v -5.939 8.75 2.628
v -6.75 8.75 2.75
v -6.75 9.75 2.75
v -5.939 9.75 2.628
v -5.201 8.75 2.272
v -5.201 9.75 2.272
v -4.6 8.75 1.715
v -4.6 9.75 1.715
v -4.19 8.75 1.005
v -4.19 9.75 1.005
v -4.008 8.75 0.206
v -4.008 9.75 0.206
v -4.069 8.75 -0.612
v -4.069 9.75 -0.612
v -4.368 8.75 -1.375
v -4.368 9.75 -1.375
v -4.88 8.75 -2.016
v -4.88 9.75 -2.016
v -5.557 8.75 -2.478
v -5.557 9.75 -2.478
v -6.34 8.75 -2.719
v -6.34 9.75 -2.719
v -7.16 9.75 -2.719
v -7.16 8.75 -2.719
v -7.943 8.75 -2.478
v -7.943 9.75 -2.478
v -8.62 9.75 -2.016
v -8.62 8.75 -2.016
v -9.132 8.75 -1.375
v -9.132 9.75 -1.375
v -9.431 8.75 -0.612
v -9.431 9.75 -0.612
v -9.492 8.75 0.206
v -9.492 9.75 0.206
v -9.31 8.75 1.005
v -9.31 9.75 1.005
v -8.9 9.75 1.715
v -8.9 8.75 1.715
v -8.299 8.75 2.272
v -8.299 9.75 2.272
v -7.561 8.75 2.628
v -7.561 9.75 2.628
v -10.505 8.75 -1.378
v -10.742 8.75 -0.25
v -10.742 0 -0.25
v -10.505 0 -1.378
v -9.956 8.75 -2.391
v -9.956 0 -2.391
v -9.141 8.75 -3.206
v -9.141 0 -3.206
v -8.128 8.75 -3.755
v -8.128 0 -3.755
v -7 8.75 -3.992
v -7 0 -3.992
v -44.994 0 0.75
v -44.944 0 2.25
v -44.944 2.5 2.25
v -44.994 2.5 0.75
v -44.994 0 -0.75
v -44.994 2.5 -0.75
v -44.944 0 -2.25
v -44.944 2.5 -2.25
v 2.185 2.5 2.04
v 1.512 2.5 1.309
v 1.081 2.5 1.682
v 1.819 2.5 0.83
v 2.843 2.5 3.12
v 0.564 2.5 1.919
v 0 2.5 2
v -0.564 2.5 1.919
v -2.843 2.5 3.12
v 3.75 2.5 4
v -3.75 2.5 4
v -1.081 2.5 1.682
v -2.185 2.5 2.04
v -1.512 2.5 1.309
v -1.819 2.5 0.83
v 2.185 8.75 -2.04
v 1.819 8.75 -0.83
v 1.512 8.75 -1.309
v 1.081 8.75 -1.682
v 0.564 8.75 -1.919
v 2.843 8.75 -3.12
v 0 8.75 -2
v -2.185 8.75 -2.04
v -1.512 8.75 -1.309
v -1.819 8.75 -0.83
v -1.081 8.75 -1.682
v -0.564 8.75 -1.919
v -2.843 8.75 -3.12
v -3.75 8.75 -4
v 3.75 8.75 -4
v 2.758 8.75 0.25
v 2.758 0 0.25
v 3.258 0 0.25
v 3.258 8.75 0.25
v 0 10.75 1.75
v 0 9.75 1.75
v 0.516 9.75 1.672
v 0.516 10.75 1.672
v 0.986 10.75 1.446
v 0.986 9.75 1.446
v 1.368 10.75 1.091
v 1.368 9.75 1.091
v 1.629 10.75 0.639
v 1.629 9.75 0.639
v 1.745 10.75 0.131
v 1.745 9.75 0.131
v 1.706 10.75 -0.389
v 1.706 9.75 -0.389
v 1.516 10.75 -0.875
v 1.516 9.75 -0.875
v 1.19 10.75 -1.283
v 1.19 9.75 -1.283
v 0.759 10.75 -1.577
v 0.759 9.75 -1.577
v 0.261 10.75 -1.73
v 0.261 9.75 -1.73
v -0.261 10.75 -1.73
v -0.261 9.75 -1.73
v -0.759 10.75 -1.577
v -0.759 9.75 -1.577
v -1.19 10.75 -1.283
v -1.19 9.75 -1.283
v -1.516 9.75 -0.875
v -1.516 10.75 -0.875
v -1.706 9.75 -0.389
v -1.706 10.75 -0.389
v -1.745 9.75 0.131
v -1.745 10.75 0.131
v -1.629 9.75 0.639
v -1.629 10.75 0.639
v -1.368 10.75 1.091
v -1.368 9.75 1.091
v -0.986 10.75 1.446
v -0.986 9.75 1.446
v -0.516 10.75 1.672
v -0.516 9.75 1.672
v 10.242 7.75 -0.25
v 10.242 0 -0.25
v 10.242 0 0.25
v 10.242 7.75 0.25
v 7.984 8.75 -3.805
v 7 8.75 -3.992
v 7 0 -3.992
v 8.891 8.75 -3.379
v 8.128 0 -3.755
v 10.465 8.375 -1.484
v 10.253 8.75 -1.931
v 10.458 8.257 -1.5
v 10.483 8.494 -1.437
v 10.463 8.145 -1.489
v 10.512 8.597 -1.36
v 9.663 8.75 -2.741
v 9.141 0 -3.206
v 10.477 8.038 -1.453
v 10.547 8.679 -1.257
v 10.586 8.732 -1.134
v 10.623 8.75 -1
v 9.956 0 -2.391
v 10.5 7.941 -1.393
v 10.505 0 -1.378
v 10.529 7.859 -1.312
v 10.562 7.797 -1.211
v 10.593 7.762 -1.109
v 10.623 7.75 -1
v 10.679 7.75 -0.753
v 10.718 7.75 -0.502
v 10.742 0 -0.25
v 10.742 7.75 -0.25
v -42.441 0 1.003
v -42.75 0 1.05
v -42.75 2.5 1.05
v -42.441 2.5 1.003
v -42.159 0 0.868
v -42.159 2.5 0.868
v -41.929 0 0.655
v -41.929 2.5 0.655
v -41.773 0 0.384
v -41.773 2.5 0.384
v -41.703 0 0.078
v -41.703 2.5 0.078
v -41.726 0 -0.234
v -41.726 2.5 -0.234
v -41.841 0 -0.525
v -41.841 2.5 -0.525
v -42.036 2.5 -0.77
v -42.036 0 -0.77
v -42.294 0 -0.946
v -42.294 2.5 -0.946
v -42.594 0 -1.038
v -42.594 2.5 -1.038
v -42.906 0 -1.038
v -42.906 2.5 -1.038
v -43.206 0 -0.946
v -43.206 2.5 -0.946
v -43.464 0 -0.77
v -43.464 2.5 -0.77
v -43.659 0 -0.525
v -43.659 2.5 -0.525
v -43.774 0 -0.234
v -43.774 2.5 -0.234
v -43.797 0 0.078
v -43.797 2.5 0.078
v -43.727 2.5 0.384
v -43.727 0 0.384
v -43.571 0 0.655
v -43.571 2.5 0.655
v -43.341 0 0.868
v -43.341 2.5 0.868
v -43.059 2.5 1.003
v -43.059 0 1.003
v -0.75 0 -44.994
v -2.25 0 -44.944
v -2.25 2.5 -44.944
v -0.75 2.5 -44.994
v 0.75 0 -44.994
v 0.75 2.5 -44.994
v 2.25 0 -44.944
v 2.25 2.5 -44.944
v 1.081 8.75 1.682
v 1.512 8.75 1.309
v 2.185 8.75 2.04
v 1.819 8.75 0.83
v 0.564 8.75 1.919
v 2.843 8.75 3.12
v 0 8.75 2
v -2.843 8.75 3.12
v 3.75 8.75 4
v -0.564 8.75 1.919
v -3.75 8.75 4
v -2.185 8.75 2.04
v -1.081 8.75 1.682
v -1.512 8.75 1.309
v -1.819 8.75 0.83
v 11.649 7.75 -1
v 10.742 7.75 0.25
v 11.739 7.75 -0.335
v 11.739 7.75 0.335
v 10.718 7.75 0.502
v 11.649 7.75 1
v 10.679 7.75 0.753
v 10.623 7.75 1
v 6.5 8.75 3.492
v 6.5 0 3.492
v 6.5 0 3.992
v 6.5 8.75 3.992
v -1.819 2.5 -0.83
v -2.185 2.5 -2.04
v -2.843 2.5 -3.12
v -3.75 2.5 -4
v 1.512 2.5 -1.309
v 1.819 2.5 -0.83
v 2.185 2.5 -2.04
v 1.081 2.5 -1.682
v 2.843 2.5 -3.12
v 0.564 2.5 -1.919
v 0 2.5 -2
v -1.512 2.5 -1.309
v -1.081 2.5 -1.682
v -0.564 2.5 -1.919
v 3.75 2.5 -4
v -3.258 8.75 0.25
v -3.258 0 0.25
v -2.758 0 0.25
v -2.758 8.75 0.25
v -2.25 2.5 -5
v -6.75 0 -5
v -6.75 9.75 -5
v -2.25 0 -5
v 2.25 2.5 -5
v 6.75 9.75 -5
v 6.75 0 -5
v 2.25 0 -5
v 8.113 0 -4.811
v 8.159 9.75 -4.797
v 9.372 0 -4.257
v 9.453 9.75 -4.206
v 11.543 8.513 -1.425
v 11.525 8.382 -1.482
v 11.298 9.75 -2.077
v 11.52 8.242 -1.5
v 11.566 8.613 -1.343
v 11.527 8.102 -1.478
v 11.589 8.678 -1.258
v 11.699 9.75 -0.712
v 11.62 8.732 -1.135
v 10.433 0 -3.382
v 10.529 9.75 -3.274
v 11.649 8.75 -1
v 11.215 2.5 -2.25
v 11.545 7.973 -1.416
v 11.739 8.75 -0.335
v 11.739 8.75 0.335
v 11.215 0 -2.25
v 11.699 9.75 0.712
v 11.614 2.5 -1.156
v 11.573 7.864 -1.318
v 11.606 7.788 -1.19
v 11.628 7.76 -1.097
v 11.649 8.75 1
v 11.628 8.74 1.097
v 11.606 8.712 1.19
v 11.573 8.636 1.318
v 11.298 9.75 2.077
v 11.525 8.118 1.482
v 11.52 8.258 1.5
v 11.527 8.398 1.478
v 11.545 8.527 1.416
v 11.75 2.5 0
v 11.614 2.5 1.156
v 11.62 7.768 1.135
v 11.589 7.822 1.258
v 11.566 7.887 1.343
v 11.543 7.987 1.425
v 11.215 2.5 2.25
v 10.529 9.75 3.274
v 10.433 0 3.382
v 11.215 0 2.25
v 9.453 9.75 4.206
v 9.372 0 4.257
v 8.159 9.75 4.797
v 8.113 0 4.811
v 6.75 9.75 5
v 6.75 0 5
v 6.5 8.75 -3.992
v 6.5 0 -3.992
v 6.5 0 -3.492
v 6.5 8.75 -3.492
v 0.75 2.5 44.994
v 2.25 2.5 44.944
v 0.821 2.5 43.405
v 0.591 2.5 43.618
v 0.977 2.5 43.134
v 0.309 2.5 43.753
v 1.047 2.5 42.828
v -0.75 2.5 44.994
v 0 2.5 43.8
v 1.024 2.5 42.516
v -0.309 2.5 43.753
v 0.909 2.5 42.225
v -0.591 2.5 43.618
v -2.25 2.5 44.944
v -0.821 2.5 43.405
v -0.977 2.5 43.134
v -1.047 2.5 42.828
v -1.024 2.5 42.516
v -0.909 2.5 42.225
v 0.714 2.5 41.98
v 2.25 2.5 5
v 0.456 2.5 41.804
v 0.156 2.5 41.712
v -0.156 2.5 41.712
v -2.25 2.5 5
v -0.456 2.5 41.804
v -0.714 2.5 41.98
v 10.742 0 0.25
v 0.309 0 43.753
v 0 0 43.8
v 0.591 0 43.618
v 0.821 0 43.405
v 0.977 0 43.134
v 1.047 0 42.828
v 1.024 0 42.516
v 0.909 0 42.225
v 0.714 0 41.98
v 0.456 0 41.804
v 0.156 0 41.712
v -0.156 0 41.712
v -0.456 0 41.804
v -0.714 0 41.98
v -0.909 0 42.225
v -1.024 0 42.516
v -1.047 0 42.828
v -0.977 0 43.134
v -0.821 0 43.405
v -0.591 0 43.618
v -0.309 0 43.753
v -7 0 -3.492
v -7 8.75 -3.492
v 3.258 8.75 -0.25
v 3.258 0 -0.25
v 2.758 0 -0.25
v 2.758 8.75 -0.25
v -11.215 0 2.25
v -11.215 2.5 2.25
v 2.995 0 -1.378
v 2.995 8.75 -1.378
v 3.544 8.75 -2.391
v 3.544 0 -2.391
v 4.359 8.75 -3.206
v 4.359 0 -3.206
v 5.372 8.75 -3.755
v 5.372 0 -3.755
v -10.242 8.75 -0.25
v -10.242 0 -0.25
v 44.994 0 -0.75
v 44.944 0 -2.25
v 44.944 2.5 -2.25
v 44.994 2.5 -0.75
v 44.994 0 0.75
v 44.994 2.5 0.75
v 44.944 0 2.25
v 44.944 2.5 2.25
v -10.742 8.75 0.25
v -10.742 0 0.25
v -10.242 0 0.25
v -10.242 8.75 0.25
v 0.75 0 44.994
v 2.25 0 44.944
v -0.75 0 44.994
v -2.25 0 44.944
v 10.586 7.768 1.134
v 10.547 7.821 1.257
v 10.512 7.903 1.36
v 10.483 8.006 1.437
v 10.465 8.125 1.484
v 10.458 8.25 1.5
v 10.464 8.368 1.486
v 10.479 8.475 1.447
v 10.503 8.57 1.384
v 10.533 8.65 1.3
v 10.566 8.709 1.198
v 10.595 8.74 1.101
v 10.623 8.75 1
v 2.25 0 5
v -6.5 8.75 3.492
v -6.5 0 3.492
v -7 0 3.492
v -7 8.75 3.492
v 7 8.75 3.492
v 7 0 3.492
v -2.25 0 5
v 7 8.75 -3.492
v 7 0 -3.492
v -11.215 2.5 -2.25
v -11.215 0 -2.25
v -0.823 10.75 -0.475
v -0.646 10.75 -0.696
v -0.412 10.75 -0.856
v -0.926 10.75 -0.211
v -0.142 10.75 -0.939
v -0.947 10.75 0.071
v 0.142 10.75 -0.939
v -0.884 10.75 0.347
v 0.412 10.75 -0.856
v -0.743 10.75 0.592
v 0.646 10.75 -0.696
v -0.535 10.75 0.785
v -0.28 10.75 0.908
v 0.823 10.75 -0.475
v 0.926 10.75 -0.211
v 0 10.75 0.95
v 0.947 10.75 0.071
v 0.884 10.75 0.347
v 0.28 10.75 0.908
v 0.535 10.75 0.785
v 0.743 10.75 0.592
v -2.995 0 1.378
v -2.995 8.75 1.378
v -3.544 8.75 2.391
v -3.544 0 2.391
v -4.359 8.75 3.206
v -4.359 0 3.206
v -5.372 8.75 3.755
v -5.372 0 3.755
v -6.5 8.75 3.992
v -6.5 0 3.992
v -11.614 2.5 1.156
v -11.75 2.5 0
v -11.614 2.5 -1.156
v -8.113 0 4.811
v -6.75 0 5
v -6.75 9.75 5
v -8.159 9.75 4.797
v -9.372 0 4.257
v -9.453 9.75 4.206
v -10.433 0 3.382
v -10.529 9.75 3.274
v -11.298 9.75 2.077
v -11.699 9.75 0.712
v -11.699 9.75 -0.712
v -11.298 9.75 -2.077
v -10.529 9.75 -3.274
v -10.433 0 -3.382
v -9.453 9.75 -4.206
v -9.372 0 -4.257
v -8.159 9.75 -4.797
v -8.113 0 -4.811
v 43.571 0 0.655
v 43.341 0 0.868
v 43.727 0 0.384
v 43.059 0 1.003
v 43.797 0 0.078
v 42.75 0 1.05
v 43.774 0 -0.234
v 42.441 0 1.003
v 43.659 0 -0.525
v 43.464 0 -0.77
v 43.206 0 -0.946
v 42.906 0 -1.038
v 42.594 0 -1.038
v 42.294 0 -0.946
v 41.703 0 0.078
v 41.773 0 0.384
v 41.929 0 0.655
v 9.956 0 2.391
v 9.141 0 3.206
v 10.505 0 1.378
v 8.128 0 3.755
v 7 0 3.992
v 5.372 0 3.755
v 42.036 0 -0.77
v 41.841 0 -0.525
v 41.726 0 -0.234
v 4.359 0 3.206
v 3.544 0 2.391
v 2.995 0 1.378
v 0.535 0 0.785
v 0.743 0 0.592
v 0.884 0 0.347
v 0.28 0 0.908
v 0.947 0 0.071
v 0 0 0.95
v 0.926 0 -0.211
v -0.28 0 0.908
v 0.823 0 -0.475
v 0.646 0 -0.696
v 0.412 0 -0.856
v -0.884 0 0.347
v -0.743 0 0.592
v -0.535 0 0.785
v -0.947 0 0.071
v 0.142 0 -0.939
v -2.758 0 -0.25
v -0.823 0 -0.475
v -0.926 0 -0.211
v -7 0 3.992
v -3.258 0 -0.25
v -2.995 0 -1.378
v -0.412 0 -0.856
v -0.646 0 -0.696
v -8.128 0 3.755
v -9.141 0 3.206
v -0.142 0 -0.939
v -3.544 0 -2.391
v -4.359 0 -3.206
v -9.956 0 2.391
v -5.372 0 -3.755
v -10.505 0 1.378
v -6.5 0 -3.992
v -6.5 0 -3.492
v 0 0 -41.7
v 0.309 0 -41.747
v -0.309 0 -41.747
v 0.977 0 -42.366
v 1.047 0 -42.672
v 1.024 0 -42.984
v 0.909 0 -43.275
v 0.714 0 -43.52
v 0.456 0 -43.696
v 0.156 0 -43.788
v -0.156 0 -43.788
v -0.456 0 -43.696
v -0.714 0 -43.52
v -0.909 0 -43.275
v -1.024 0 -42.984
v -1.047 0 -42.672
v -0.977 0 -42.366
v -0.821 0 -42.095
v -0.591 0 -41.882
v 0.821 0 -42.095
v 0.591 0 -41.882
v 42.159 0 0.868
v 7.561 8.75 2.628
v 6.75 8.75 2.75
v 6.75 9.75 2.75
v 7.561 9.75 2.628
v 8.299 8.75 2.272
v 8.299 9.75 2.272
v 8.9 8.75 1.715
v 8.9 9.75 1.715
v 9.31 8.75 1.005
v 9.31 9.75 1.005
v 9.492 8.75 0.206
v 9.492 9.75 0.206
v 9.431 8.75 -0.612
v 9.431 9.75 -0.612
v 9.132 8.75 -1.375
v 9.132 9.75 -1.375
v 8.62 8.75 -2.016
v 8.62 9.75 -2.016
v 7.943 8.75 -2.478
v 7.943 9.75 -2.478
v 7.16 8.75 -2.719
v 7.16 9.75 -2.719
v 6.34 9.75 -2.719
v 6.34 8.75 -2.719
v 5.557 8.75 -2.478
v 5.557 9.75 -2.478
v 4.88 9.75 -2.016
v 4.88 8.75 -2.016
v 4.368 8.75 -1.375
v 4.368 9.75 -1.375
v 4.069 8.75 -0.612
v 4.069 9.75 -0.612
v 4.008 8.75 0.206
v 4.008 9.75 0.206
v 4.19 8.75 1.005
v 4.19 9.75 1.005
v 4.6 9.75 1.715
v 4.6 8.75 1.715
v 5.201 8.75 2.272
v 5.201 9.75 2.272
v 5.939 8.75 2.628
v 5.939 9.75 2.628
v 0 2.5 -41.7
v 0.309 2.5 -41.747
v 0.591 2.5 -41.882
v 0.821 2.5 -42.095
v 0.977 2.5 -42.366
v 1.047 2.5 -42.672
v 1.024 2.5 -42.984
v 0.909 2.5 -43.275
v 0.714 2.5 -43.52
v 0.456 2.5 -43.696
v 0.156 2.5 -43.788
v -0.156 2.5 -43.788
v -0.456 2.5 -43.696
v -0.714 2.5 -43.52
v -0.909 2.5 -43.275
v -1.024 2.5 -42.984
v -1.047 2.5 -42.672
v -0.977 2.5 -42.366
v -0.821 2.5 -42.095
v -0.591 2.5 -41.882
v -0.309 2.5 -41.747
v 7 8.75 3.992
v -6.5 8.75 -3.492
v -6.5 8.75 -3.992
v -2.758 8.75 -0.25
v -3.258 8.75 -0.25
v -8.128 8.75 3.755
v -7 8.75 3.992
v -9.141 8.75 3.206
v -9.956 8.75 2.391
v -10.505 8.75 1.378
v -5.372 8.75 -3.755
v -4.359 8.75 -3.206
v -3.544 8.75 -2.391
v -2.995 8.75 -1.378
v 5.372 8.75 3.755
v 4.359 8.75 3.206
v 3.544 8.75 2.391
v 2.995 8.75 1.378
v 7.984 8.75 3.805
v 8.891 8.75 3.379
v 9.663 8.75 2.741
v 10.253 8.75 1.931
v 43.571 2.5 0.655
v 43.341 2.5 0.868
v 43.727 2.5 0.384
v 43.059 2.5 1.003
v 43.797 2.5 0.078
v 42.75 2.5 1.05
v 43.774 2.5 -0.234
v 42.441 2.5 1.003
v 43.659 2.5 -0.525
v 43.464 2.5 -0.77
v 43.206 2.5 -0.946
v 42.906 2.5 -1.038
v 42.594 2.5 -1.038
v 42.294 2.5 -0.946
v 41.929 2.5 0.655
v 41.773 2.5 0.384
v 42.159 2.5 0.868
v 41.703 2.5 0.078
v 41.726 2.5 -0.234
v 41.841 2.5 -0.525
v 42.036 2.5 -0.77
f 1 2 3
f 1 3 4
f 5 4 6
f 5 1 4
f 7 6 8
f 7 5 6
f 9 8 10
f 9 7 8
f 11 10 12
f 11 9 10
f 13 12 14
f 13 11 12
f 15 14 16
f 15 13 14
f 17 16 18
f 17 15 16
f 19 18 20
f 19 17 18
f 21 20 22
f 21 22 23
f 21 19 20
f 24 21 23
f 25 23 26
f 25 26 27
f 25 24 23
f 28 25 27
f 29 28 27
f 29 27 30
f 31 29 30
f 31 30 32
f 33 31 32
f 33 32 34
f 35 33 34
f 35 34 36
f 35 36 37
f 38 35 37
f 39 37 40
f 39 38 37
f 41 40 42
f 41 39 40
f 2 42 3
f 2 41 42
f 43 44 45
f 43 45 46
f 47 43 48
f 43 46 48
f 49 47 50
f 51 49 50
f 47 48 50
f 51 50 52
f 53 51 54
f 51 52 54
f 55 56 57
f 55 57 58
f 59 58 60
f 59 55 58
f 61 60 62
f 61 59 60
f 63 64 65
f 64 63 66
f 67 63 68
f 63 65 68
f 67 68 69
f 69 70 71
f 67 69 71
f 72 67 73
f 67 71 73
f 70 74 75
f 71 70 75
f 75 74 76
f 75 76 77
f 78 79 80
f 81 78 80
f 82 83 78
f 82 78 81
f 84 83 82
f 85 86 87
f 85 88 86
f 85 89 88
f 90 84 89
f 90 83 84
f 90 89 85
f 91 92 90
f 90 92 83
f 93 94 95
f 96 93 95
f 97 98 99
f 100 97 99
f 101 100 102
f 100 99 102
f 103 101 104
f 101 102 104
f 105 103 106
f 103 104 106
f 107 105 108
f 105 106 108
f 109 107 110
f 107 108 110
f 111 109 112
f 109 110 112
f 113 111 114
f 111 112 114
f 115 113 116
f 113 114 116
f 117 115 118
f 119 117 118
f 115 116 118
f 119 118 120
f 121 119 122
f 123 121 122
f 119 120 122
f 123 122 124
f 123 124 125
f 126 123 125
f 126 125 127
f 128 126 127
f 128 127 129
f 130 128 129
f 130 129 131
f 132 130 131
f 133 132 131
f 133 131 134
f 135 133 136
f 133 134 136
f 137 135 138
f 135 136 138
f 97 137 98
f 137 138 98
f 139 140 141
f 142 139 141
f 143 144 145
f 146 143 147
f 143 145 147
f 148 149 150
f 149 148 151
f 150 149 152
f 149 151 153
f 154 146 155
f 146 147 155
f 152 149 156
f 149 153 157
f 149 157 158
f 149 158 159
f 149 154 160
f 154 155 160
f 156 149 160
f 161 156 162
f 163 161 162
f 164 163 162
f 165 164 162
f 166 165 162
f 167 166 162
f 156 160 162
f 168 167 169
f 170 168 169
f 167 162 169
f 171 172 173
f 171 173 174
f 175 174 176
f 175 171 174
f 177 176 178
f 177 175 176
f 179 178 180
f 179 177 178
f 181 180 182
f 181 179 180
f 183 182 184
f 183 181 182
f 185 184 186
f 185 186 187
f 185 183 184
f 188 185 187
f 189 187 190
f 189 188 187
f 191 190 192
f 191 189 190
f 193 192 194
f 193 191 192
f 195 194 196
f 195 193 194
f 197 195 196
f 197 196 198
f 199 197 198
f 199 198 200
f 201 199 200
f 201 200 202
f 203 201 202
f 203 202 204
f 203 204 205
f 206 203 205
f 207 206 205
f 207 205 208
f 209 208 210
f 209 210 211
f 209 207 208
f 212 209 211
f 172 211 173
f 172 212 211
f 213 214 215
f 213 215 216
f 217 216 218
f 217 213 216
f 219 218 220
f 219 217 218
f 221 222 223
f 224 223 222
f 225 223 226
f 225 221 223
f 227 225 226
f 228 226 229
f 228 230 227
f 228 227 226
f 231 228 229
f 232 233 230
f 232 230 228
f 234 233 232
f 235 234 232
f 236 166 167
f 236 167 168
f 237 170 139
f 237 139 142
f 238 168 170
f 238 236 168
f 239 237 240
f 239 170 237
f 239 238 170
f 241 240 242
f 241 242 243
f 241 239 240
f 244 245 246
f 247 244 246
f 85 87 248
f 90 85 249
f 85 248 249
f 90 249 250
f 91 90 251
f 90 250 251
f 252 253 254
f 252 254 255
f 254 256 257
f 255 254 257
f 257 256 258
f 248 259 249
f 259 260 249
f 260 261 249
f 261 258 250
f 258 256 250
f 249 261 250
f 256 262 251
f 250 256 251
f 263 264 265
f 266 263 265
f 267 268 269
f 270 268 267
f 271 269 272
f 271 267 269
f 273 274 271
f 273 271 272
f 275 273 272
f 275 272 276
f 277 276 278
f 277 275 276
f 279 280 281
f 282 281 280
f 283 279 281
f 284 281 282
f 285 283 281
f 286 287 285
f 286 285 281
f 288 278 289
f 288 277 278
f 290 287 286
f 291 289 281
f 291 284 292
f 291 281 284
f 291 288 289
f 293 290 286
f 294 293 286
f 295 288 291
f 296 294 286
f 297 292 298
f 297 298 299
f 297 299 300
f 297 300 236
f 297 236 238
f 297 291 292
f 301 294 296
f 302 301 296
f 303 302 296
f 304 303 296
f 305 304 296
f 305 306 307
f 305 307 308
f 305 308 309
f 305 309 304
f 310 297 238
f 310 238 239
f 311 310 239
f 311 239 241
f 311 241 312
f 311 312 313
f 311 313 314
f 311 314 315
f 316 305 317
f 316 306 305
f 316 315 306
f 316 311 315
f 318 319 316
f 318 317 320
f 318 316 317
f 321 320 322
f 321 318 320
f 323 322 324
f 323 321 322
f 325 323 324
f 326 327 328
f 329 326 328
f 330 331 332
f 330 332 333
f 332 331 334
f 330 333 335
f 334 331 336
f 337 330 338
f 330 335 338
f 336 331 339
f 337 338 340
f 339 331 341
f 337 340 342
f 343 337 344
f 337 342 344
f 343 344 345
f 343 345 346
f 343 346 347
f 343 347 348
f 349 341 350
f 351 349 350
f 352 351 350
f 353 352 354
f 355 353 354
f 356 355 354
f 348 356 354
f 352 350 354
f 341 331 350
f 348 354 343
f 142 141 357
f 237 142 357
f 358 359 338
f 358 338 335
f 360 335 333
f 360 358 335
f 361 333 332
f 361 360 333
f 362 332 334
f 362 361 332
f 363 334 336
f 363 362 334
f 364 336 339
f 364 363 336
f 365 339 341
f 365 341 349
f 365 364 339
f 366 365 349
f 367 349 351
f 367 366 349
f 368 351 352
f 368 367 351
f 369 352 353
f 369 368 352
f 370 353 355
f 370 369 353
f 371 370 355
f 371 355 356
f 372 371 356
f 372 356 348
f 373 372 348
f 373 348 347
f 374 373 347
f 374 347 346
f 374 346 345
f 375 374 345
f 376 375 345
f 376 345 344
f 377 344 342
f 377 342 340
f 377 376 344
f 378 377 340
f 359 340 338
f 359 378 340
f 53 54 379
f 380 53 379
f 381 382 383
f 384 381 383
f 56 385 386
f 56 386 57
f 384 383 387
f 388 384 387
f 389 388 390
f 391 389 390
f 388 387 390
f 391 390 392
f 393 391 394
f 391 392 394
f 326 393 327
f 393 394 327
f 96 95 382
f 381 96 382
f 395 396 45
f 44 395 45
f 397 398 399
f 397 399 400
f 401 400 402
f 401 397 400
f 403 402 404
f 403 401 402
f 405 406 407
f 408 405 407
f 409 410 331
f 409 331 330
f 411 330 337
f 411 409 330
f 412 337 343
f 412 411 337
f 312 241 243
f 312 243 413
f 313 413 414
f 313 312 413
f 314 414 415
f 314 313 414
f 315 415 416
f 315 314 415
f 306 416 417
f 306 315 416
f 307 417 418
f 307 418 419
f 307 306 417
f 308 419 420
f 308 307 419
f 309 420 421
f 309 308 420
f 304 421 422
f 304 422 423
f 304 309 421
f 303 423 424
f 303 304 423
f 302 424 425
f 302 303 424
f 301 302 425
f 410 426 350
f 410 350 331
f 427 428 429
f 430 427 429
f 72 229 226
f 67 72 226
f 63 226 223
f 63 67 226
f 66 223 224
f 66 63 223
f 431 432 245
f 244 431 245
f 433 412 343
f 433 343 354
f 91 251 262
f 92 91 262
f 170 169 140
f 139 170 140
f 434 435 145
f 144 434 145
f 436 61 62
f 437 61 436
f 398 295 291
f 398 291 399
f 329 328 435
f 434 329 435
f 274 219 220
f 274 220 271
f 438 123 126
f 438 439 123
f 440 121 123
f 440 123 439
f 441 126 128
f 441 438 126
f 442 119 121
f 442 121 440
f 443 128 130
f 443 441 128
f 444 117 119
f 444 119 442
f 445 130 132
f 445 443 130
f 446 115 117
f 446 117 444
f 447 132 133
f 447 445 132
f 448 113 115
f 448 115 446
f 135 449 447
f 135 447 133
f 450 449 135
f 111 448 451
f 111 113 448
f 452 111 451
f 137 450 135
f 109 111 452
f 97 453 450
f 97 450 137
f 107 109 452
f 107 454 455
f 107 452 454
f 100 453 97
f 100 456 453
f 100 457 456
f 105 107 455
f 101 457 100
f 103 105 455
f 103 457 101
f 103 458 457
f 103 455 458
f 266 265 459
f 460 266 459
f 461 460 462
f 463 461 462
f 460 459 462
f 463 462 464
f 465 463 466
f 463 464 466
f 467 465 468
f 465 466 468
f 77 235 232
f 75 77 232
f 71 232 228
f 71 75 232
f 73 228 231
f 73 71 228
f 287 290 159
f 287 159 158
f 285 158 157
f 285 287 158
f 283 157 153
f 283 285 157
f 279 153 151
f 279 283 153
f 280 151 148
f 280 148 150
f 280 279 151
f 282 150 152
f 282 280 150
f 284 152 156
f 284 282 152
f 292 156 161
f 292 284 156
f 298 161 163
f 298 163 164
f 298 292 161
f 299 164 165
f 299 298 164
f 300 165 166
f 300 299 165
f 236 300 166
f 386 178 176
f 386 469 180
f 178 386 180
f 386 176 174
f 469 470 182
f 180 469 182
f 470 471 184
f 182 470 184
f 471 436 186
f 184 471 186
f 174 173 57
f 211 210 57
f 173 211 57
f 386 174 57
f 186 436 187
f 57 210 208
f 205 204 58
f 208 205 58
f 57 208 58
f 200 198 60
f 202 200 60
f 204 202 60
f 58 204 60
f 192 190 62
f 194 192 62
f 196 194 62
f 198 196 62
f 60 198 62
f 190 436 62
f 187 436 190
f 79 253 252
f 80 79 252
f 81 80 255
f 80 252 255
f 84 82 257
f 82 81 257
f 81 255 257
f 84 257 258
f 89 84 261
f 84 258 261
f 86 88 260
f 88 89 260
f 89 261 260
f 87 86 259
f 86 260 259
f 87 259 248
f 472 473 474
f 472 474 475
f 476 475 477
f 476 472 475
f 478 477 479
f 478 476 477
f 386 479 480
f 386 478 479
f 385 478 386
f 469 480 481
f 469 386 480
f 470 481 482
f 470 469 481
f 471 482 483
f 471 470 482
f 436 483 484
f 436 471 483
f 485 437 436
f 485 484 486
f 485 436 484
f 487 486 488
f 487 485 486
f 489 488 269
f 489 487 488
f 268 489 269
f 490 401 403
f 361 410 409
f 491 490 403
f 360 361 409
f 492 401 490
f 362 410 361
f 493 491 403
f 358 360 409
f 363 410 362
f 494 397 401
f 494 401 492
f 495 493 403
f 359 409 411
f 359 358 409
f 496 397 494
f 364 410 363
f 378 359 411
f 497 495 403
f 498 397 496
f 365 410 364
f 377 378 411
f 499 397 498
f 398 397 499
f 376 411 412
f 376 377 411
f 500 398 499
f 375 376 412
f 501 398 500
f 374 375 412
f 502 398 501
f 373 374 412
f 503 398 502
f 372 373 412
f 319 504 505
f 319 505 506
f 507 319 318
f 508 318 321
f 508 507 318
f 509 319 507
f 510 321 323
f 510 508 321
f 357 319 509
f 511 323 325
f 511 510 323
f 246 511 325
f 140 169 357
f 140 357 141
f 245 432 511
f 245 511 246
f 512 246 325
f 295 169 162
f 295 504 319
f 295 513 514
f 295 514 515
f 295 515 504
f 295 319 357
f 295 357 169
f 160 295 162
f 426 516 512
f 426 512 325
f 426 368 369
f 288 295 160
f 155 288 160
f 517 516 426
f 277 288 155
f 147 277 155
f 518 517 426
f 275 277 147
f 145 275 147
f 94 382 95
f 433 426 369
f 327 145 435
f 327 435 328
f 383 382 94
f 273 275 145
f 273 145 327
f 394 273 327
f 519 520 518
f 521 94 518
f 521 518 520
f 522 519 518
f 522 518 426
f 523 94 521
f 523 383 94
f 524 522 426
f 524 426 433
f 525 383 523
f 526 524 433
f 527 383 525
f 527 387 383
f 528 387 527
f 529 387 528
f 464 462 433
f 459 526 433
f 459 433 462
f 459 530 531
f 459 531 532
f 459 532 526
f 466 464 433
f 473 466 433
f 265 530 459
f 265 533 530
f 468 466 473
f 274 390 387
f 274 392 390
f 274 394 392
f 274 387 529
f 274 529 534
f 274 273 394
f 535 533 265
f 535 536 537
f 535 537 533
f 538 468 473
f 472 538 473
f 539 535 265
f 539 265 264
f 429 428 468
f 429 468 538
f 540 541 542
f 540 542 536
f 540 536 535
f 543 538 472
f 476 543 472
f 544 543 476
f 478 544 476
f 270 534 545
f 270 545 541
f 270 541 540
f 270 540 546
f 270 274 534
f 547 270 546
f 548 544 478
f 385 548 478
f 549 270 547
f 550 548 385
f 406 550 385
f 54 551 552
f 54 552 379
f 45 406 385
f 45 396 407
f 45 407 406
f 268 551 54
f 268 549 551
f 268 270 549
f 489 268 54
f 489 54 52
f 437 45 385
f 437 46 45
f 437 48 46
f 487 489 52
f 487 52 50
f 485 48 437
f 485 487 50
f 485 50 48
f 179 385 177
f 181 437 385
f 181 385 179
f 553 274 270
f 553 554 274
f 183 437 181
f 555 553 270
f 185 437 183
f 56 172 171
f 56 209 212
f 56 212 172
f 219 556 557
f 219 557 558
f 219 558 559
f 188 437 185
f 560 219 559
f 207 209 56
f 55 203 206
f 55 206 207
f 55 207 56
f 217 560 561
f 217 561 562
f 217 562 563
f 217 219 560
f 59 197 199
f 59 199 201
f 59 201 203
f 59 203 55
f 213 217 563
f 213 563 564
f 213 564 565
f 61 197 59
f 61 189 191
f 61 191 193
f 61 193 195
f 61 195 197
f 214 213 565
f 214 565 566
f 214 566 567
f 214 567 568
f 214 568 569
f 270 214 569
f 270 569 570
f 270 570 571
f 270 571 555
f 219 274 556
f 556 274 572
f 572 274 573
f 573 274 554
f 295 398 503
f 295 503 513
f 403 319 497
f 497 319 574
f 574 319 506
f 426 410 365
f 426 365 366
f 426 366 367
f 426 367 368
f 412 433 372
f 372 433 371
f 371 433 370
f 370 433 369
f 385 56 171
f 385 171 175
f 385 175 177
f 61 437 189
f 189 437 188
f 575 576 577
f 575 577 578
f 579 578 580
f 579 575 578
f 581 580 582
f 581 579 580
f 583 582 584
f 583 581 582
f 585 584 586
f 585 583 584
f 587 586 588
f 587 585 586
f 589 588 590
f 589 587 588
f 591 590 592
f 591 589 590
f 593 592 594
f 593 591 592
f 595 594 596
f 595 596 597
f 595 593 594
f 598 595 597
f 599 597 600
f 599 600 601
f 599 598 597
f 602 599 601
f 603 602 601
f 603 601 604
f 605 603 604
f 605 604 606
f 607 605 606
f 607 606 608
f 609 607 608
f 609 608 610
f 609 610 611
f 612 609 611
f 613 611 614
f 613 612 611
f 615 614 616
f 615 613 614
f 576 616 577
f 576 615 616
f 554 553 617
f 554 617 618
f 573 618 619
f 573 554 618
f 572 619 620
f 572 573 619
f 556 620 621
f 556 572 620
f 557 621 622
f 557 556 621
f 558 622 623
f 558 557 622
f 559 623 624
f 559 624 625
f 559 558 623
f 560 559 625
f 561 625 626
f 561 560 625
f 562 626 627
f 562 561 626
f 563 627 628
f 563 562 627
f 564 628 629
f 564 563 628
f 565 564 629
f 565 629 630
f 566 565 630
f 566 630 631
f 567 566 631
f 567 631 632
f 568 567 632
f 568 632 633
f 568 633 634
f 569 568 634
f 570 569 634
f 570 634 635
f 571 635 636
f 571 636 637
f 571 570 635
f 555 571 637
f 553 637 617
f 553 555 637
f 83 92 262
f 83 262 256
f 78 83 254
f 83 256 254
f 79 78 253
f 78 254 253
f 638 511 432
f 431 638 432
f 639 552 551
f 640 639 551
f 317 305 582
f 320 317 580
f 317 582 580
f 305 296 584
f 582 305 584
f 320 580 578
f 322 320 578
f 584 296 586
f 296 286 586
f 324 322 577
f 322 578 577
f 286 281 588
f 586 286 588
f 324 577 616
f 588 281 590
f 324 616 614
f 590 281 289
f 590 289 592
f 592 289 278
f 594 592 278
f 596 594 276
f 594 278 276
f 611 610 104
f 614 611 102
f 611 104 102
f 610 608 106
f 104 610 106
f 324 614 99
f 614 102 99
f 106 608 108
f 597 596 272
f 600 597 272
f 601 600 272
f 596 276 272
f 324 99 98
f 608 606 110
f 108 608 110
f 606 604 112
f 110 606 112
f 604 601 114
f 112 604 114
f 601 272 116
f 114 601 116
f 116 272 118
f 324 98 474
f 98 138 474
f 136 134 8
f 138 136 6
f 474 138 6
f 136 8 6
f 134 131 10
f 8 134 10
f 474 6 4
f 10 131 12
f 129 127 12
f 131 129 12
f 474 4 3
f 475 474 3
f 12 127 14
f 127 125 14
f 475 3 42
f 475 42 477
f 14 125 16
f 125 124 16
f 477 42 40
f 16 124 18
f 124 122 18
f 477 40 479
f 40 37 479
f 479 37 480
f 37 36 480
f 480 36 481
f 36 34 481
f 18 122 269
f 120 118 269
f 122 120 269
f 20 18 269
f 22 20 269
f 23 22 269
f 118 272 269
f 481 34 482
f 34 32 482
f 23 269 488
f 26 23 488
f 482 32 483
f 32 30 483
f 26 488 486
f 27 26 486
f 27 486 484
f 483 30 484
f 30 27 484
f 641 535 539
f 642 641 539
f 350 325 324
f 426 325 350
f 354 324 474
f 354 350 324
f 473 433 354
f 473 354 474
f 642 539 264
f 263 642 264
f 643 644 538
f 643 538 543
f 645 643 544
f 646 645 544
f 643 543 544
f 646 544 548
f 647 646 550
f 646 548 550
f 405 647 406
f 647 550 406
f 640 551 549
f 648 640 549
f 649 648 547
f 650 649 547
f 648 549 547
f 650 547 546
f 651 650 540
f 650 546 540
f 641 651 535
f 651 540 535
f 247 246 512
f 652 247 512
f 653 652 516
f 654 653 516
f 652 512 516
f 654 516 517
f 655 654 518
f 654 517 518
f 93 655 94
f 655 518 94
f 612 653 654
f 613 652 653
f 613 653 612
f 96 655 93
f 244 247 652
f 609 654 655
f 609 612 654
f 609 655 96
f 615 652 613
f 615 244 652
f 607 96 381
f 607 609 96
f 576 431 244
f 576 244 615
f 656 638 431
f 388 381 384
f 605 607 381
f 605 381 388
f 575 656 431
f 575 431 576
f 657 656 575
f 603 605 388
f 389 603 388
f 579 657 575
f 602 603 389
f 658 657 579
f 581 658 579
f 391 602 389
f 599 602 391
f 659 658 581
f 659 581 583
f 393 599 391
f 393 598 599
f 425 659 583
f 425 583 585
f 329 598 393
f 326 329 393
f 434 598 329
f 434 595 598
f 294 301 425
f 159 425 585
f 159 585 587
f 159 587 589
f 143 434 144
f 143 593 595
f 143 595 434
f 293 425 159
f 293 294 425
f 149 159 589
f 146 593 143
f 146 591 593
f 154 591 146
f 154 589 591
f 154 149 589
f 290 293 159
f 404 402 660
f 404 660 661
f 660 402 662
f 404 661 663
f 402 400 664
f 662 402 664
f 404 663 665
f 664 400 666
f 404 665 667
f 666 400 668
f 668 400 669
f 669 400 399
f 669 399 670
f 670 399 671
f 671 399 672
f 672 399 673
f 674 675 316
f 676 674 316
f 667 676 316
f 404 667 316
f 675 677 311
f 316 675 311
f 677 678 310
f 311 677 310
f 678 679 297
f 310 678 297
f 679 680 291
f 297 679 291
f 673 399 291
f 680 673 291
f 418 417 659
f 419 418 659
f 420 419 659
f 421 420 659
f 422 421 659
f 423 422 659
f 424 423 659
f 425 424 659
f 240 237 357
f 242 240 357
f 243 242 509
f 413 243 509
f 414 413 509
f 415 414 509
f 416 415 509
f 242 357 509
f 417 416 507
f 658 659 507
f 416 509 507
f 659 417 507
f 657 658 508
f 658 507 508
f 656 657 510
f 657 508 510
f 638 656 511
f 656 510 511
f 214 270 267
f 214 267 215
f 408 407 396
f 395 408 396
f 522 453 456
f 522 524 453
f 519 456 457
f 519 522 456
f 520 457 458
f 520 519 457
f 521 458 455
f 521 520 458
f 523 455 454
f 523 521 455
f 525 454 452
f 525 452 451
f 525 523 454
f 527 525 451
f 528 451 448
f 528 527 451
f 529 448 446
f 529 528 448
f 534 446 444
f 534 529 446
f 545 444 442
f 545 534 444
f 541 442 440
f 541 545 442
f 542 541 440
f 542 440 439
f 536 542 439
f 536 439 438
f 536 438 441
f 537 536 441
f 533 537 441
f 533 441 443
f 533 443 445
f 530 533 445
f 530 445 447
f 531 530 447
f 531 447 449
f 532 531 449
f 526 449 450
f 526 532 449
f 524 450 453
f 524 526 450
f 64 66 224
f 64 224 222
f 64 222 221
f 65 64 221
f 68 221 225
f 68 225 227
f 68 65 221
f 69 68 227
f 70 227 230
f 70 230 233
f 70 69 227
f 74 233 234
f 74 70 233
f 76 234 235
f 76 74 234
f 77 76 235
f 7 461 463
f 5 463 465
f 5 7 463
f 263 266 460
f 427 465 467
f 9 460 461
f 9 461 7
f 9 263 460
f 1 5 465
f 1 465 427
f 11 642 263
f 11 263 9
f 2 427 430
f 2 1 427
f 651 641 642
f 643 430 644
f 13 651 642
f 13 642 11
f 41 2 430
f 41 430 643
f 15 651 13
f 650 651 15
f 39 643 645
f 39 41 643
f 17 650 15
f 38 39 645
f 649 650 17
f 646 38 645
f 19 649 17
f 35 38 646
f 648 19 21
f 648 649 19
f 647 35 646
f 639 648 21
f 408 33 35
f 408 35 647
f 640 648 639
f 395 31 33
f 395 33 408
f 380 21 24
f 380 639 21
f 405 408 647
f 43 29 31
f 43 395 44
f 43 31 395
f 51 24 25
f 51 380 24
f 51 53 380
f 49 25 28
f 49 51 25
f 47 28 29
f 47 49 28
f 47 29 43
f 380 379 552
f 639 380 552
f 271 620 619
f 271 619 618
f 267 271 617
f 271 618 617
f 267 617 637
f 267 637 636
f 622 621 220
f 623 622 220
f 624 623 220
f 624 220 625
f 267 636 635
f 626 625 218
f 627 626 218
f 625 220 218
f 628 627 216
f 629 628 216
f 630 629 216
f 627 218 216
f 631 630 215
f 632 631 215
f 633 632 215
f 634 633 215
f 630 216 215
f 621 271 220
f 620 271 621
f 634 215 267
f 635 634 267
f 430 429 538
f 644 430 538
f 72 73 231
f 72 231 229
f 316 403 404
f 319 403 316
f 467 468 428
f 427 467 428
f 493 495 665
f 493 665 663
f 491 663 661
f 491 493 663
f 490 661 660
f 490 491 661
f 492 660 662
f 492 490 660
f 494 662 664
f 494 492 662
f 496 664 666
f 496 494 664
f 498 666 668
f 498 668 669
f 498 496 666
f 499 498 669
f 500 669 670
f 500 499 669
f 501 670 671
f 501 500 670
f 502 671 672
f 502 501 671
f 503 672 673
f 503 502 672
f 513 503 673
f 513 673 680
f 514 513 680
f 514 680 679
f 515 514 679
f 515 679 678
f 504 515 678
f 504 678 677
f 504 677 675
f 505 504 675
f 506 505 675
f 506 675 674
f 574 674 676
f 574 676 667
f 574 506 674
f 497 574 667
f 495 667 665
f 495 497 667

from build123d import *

# Parameters (mm, degrees)
SKETCH1_R             = 1.05
BOSS_EXTRUDE1_DEPTH   = 2.5
SKETCH1_R_2           = 0.95
BOSS_EXTRUDE1_2_DEPTH = 2.5
BOSS_EXTRUDE1_3_DEPTH = 2.5
SKETCH2_R             = 0.95
BOSS_EXTRUDE2_DEPTH   = 9.75
BOSS_EXTRUDE3_START   = -1
SKETCH3_R             = 0.95
SKETCH3_R_2           = 2.75
BOSS_EXTRUDE3_DEPTH   = 1
SKETCH4_R             = 1.75
SKETCH4_R_2           = 0.95
BOSS_EXTRUDE4_DEPTH   = 1
CUT_EXTRUDE3_DEPTH    = 2


with BuildPart() as part:
    # Sketch1 → Boss-Extrude1 (new body)
    with BuildSketch(Plane(origin=(0, 0, 0), x_dir=(1, 0, 0), z_dir=(0, 1, 0))):
        with BuildLine():
            Line((-44.9437148, 2.25), (-11.215142775, 2.25))
            ThreePointArc((-11.215142775, 2.25), (-11.75, 0), (-11.215142775, -2.25))
            Line((-11.215142775, -2.25), (-44.9437148, -2.25))
            ThreePointArc((-44.9437148, -2.25), (-45, 0), (-44.9437148, 2.25))
        make_face()
        with Locations(Location((-42.75, 0, 0), (0, 0, 270))):
            Circle(SKETCH1_R, mode=Mode.SUBTRACT)
    extrude(amount=BOSS_EXTRUDE1_DEPTH)



with BuildPart() as body_2:
    # Sketch1 → Boss-Extrude1 2 (new body)
    with BuildSketch(Plane(origin=(0, 0, 0), x_dir=(1, 0, 0), z_dir=(0, 1, 0))):
        with BuildLine():
            Line((2.25, 44.9437148), (2.25, 5))
            Line((2.25, 5), (6.75, 5))
            ThreePointArc((6.75, 5), (1.75, 0), (6.75, -5))
            Line((6.75, -5), (2.25, -5))
            Line((2.25, -5), (2.25, -44.9437148))
            ThreePointArc((2.25, -44.9437148), (0, -45), (-2.25, -44.9437148))
            Line((-2.25, -44.9437148), (-2.25, -5))
            Line((-2.25, -5), (-6.75, -5))
            ThreePointArc((-6.75, -5), (-1.75, 0), (-6.75, 5))
            Line((-6.75, 5), (-2.25, 5))
            Line((-2.25, 5), (-2.25, 44.9437148))
            ThreePointArc((-2.25, 44.9437148), (0, 45), (2.25, 44.9437148))
        make_face()
        with Locations(Location((0, 0, 0), (0, 0, 270))):
            Circle(SKETCH1_R_2, mode=Mode.SUBTRACT)
        with Locations(Location((0, 42.75, 0), (0, 0, 270))):
            Circle(SKETCH1_R, mode=Mode.SUBTRACT)
        with Locations(Location((0, -42.75, 0), (0, 0, 270))):
            Circle(SKETCH1_R, mode=Mode.SUBTRACT)
    extrude(amount=BOSS_EXTRUDE1_2_DEPTH)


with BuildPart() as body_3:
    # Sketch1 → Boss-Extrude1 3 (new body)
    with BuildSketch(Plane(origin=(0, 0, 0), x_dir=(1, 0, 0), z_dir=(0, 1, 0))):
        with BuildLine():
            Line((44.9437148, -2.25), (11.215142775, -2.25))
            ThreePointArc((11.215142775, -2.25), (11.75, 0), (11.215142775, 2.25))
            Line((11.215142775, 2.25), (44.9437148, 2.25))
            ThreePointArc((44.9437148, 2.25), (45, 0), (44.9437148, -2.25))
        make_face()
        with Locations(Location((42.75, 0, 0), (0, 0, 270))):
            Circle(SKETCH1_R, mode=Mode.SUBTRACT)
    extrude(amount=BOSS_EXTRUDE1_3_DEPTH)


with BuildPart() as part_1:
    add(part.part)

    add(body_2.part)  # Boss-Extrude2 merges body 2

    add(body_3.part)  # Boss-Extrude2 merges body 3
    # Sketch2 → Boss-Extrude2 (add)
    with BuildSketch(Plane(origin=(0, 0, 0), x_dir=(1, 0, 0), z_dir=(0, 1, 0))):
        with BuildLine():
            Line((-6.75, 5), (6.75, 5))
            ThreePointArc((6.75, 5), (11.75, 0), (6.75, -5))
            Line((6.75, -5), (-6.75, -5))
            ThreePointArc((-6.75, -5), (-11.75, 0), (-6.75, 5))
        make_face()
        with Locations(Location((0, 0, 0), (0, 0, 270))):
            Circle(SKETCH2_R, mode=Mode.SUBTRACT)
        with BuildLine():
            Line((-7, 3.992179856), (-7, 3.492179856))
            Line((-7, 3.492179856), (-6.5, 3.492179856))
            Line((-6.5, 3.492179856), (-6.5, 3.992179856))
            ThreePointArc((-6.5, 3.992179856), (-3.921572875, 2.828427125), (-2.757820144, 0.25))
            Line((-2.757820144, 0.25), (-3.257820144, 0.25))
            Line((-3.257820144, 0.25), (-3.257820144, -0.25))
            Line((-3.257820144, -0.25), (-2.757820144, -0.25))
            ThreePointArc((-2.757820144, -0.25), (-3.921572875, -2.828427125), (-6.5, -3.992179856))
            Line((-6.5, -3.992179856), (-6.5, -3.492179856))
            Line((-6.5, -3.492179856), (-7, -3.492179856))
            Line((-7, -3.492179856), (-7, -3.992179856))
            ThreePointArc((-7, -3.992179856), (-9.578427125, -2.828427125), (-10.742179856, -0.25))
            Line((-10.742179856, -0.25), (-10.242179856, -0.25))
            Line((-10.242179856, -0.25), (-10.242179856, 0.25))
            Line((-10.242179856, 0.25), (-10.742179856, 0.25))
            ThreePointArc((-10.742179856, 0.25), (-9.578427125, 2.828427125), (-7, 3.992179856))
        make_face(mode=Mode.SUBTRACT)
        with BuildLine():
            Line((6.5, 3.992179856), (6.5, 3.492179856))
            Line((6.5, 3.492179856), (7, 3.492179856))
            Line((7, 3.492179856), (7, 3.992179856))
            ThreePointArc((7, 3.992179856), (9.578427125, 2.828427125), (10.742179856, 0.25))
            Line((10.742179856, 0.25), (10.242179856, 0.25))
            Line((10.242179856, 0.25), (10.242179856, -0.25))
            Line((10.242179856, -0.25), (10.742179856, -0.25))
            ThreePointArc((10.742179856, -0.25), (9.578427125, -2.828427125), (7, -3.992179856))
            Line((7, -3.992179856), (7, -3.492179856))
            Line((7, -3.492179856), (6.5, -3.492179856))
            Line((6.5, -3.492179856), (6.5, -3.992179856))
            ThreePointArc((6.5, -3.992179856), (3.921572875, -2.828427125), (2.757820144, -0.25))
            Line((2.757820144, -0.25), (3.257820144, -0.25))
            Line((3.257820144, -0.25), (3.257820144, 0.25))
            Line((3.257820144, 0.25), (2.757820144, 0.25))
            ThreePointArc((2.757820144, 0.25), (3.921572875, 2.828427125), (6.5, 3.992179856))
        make_face(mode=Mode.SUBTRACT)
        with BuildLine():
            Line((-3.75, 4), (3.75, 4))
            ThreePointArc((3.75, 4), (2.479758346, 2.600968322), (1.819444444, 0.830434774))
            ThreePointArc((1.819444444, 0.830434774), (0, 2), (-1.819444444, 0.830434774))
            ThreePointArc((-1.819444444, 0.830434774), (-2.479758346, 2.600968322), (-3.75, 4))
        make_face(mode=Mode.SUBTRACT)
        with BuildLine():
            Line((-3.75, -4), (3.75, -4))
            ThreePointArc((3.75, -4), (2.479758346, -2.600968322), (1.819444444, -0.830434774))
            ThreePointArc((1.819444444, -0.830434774), (0, -2), (-1.819444444, -0.830434774))
            ThreePointArc((-1.819444444, -0.830434774), (-2.479758346, -2.600968322), (-3.75, -4))
        make_face(mode=Mode.SUBTRACT)
    extrude(amount=BOSS_EXTRUDE2_DEPTH)

    # Sketch3 → Boss-Extrude3 (add)
    with BuildSketch(Plane(origin=(0, 9.75, 0), x_dir=(1, 0, 0), z_dir=(0, 1, 0)).offset(BOSS_EXTRUDE3_START)):
        with BuildLine():
            Line((-6.75, 5), (6.75, 5))
            ThreePointArc((6.75, 5), (11.75, 0), (6.75, -5))
            Line((6.75, -5), (-6.75, -5))
            ThreePointArc((-6.75, -5), (-11.75, 0), (-6.75, 5))
        make_face()
        with Locations(Location((0, 0, 0), (0, 0, 270))):
            Circle(SKETCH3_R, mode=Mode.SUBTRACT)
        with Locations(Location((-6.75, 0, 0), (0, 0, 270))):
            Circle(SKETCH3_R_2, mode=Mode.SUBTRACT)
        with Locations(Location((6.75, 0, 0), (0, 0, 270))):
            Circle(SKETCH3_R_2, mode=Mode.SUBTRACT)
    extrude(amount=BOSS_EXTRUDE3_DEPTH)

    # Sketch4 → Boss-Extrude4 (add)
    with BuildSketch(Plane(origin=(0, 9.75, 0), x_dir=(1, 0, 0), z_dir=(0, 1, 0))):
        with Locations(Location((0, 0, 0), (0, 0, 270))):
            Circle(SKETCH4_R)
        with Locations(Location((0, 0, 0), (0, 0, 270))):
            Circle(SKETCH4_R_2, mode=Mode.SUBTRACT)
    extrude(amount=BOSS_EXTRUDE4_DEPTH)

    # Sketch7 → Cut-Extrude3 (cut)
    with BuildSketch(Plane(origin=(11.75, 0, 0), x_dir=(0, 0, -1), z_dir=(1, 0, 0))):
        with BuildLine():
            Line((-1, 8.75), (1, 8.75))
            ThreePointArc((1, 8.75), (1.5, 8.25), (1, 7.75))
            Line((1, 7.75), (-1, 7.75))
            ThreePointArc((-1, 7.75), (-1.5, 8.25), (-1, 8.75))
        make_face()
    extrude(amount=-CUT_EXTRUDE3_DEPTH, mode=Mode.SUBTRACT)


solid = part_1.part
